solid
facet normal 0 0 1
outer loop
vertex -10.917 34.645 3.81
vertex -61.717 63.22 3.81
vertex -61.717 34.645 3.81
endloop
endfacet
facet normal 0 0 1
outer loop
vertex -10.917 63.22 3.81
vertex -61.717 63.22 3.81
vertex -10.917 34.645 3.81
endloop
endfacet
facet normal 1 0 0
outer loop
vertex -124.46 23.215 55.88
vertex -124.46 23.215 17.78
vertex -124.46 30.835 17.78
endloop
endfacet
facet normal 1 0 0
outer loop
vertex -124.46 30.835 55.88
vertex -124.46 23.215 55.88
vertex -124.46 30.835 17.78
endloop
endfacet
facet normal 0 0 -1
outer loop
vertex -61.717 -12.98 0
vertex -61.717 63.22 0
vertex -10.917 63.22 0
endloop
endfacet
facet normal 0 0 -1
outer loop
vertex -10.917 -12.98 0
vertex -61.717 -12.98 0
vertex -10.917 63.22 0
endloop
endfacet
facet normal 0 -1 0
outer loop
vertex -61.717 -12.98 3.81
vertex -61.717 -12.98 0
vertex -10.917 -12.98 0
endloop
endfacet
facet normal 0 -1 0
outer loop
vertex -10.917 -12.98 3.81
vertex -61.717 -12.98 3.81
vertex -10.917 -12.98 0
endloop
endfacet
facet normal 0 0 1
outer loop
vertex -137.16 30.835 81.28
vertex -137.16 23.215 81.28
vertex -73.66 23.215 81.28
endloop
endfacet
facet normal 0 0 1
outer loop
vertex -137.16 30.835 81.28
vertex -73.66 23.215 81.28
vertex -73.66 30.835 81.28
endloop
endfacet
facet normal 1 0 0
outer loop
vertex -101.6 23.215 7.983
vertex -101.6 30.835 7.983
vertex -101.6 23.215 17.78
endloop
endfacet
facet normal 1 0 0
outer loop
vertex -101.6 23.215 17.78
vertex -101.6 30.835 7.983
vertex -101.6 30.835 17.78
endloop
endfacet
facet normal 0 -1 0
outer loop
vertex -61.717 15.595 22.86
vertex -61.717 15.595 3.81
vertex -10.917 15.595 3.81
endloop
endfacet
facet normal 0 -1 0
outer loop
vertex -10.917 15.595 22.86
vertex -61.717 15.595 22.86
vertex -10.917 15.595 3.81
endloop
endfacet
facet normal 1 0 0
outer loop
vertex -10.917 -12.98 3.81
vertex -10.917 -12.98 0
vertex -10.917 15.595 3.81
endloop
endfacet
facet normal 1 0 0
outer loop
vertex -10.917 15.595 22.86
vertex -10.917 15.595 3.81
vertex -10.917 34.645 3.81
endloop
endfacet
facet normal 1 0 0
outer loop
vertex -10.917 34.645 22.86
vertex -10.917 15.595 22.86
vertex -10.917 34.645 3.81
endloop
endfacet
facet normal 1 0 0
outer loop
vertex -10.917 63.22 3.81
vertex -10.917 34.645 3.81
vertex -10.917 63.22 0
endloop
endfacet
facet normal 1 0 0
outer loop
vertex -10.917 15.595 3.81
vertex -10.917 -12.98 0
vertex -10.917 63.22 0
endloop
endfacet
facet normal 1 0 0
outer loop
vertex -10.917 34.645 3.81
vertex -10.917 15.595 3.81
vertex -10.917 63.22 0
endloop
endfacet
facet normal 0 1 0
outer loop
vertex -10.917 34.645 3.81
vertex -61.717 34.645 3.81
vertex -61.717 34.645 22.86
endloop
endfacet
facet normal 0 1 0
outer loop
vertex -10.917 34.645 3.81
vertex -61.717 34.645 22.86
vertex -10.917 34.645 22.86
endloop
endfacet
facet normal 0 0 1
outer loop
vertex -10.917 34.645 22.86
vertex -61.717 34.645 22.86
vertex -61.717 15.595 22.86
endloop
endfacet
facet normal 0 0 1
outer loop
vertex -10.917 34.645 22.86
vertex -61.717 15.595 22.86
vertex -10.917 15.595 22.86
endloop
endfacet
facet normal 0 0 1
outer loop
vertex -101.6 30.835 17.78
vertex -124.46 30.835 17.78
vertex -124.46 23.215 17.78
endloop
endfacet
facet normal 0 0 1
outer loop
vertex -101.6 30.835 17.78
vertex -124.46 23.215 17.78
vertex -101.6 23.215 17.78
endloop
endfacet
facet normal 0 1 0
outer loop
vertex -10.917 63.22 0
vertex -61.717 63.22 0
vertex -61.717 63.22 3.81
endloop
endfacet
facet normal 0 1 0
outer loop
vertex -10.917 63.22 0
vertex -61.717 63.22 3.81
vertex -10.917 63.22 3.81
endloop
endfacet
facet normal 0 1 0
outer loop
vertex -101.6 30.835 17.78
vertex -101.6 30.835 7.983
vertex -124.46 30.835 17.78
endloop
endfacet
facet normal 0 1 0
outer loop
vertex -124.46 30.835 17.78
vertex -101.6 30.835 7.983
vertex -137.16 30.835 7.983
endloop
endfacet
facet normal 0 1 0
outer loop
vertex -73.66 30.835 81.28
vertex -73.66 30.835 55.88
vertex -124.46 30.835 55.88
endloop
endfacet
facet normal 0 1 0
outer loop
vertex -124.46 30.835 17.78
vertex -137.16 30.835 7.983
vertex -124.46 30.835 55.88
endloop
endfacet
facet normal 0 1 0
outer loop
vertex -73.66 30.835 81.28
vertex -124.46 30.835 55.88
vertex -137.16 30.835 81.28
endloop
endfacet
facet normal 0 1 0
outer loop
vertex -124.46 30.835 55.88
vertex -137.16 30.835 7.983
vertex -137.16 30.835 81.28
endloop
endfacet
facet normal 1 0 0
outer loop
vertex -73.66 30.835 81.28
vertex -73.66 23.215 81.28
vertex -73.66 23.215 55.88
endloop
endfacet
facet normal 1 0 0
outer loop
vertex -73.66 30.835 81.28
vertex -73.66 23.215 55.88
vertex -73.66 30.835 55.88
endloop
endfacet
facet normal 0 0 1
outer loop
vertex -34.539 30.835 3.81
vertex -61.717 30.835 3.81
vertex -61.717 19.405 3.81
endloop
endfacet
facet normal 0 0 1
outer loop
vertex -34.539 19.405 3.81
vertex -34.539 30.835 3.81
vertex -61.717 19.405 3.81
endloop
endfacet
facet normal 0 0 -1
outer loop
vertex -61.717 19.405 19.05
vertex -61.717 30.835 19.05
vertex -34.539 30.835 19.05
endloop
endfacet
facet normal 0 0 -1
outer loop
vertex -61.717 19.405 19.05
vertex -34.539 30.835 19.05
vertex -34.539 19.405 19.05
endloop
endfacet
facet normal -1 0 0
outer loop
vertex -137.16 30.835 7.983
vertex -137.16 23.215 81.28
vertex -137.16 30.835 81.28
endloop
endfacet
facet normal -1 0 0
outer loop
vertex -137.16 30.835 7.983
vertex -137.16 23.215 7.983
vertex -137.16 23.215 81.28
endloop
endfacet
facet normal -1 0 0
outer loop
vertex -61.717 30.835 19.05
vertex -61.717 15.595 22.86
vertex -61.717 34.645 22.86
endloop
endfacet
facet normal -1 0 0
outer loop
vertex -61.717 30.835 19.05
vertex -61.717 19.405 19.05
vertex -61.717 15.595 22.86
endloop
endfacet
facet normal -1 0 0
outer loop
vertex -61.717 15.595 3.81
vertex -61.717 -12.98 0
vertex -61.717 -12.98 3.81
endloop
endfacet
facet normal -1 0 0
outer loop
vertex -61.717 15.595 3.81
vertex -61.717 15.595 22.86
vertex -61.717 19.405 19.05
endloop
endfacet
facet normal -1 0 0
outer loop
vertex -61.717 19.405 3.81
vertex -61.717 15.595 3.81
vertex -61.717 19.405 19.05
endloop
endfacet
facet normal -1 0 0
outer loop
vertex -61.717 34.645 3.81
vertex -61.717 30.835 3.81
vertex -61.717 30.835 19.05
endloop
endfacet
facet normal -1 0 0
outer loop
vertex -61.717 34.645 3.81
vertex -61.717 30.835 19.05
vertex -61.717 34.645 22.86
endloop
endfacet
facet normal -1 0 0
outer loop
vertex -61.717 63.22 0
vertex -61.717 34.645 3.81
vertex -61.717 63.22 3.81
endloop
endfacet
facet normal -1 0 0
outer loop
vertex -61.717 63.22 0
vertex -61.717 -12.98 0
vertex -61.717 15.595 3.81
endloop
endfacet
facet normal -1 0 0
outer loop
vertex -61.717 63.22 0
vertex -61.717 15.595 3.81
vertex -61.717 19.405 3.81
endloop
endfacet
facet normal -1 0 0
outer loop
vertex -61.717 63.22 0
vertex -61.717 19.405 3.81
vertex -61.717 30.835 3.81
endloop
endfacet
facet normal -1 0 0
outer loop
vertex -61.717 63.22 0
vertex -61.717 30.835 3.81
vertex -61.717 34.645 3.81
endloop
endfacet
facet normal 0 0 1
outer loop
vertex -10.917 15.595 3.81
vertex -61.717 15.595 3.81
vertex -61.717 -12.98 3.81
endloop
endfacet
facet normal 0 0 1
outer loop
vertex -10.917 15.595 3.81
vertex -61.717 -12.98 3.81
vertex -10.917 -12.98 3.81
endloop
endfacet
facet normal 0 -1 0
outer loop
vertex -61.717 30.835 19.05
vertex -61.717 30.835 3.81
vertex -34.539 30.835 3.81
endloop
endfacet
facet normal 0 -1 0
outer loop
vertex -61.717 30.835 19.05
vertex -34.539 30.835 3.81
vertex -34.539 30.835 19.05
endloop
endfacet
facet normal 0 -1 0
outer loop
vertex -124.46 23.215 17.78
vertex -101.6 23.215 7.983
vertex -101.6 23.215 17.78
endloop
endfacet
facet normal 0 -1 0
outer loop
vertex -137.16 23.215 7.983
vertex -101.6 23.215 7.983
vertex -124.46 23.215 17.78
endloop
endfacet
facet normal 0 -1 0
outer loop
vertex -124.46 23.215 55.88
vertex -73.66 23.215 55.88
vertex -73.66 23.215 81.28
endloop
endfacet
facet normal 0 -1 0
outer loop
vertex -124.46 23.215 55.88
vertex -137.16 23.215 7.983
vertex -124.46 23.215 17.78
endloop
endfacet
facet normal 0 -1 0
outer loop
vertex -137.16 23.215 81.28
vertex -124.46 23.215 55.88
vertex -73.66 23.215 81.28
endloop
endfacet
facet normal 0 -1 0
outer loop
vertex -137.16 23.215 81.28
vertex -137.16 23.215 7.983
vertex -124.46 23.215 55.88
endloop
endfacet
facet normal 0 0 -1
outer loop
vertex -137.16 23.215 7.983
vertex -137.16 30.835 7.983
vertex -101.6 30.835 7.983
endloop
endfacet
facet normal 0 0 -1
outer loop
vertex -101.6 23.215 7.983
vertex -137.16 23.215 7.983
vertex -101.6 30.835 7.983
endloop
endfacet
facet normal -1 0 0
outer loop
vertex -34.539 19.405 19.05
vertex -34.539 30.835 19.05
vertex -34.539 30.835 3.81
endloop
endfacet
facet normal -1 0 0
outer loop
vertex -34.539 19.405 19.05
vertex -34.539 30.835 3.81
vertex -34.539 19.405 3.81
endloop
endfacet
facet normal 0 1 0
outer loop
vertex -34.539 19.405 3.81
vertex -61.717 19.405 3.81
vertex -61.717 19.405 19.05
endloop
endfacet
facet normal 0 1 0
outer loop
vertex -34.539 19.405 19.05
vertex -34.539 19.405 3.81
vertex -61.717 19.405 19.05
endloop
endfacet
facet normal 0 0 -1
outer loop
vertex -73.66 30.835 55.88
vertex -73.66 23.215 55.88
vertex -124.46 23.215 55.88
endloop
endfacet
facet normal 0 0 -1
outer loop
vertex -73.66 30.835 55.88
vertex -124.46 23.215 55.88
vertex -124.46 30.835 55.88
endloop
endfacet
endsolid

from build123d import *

# Parameters (mm, degrees)
F0_W      = 50.8
F0_H      = 76.2
F1_DEPTH  = 3.81
F2_W      = 50.8
F2_H      = 19.05
F3_DEPTH  = 19.05
F4_W      = 11.43
F4_H      = 15.24
F5_DEPTH  = 27.178
F6_W      = 35.56
F6_H      = 9.7971428186
F7_DEPTH  = 7.62
F8_W      = 12.7
F8_H      = 7.62
F9_DEPTH  = 63.5
F10_W     = 7.62
F10_H     = 25.4
F11_DEPTH = 50.8


with BuildPart() as f1:
    # F0 (on Top) → F1 (new body)
    with BuildSketch(Plane.XY):
        with Locations((-36.3166012526, 25.1197018608)):
            Rectangle(F0_W, F0_H)
    extrude(amount=F1_DEPTH)

    # F2 (on face) → F3 (join)
    with BuildSketch(Plane.XY.offset(3.81)):
        with Locations((-36.3166012526, 25.1197018608)):
            Rectangle(F2_W, F2_H)
    extrude(amount=F3_DEPTH)

    # F4 (on face) → F5 (cut)
    with BuildSketch(Plane(origin=(-61.7166012526, 0, 0), x_dir=(0, -1, 0), z_dir=(-1, 0, 0))):
        with Locations((-25.1197018608, 11.43)):
            Rectangle(F4_W, F4_H)
    extrude(amount=-F5_DEPTH, mode=Mode.SUBTRACT)


with BuildPart() as f7:
    # F6 (on face) → F7 (new body)
    with BuildSketch(Plane.XZ.offset(-30.8347018608)):
        with Locations((-119.38, 12.8814289346)):
            Rectangle(F6_W, F6_H)
    extrude(amount=F7_DEPTH)

    # F8 (on face) → F9 (join)
    with BuildSketch(Plane.XY.offset(17.7800003439)):
        with Locations((-130.81, 27.0247018608)):
            Rectangle(F8_W, F8_H)
    extrude(amount=F9_DEPTH)

    # F10 (on face) → F11 (join)
    with BuildSketch(Plane.YZ.offset(-124.46)):
        with Locations((27.0247018608, 68.5800003439)):
            Rectangle(F10_W, F10_H)
    extrude(amount=F11_DEPTH)


solid = Compound([f1.part, f7.part])
